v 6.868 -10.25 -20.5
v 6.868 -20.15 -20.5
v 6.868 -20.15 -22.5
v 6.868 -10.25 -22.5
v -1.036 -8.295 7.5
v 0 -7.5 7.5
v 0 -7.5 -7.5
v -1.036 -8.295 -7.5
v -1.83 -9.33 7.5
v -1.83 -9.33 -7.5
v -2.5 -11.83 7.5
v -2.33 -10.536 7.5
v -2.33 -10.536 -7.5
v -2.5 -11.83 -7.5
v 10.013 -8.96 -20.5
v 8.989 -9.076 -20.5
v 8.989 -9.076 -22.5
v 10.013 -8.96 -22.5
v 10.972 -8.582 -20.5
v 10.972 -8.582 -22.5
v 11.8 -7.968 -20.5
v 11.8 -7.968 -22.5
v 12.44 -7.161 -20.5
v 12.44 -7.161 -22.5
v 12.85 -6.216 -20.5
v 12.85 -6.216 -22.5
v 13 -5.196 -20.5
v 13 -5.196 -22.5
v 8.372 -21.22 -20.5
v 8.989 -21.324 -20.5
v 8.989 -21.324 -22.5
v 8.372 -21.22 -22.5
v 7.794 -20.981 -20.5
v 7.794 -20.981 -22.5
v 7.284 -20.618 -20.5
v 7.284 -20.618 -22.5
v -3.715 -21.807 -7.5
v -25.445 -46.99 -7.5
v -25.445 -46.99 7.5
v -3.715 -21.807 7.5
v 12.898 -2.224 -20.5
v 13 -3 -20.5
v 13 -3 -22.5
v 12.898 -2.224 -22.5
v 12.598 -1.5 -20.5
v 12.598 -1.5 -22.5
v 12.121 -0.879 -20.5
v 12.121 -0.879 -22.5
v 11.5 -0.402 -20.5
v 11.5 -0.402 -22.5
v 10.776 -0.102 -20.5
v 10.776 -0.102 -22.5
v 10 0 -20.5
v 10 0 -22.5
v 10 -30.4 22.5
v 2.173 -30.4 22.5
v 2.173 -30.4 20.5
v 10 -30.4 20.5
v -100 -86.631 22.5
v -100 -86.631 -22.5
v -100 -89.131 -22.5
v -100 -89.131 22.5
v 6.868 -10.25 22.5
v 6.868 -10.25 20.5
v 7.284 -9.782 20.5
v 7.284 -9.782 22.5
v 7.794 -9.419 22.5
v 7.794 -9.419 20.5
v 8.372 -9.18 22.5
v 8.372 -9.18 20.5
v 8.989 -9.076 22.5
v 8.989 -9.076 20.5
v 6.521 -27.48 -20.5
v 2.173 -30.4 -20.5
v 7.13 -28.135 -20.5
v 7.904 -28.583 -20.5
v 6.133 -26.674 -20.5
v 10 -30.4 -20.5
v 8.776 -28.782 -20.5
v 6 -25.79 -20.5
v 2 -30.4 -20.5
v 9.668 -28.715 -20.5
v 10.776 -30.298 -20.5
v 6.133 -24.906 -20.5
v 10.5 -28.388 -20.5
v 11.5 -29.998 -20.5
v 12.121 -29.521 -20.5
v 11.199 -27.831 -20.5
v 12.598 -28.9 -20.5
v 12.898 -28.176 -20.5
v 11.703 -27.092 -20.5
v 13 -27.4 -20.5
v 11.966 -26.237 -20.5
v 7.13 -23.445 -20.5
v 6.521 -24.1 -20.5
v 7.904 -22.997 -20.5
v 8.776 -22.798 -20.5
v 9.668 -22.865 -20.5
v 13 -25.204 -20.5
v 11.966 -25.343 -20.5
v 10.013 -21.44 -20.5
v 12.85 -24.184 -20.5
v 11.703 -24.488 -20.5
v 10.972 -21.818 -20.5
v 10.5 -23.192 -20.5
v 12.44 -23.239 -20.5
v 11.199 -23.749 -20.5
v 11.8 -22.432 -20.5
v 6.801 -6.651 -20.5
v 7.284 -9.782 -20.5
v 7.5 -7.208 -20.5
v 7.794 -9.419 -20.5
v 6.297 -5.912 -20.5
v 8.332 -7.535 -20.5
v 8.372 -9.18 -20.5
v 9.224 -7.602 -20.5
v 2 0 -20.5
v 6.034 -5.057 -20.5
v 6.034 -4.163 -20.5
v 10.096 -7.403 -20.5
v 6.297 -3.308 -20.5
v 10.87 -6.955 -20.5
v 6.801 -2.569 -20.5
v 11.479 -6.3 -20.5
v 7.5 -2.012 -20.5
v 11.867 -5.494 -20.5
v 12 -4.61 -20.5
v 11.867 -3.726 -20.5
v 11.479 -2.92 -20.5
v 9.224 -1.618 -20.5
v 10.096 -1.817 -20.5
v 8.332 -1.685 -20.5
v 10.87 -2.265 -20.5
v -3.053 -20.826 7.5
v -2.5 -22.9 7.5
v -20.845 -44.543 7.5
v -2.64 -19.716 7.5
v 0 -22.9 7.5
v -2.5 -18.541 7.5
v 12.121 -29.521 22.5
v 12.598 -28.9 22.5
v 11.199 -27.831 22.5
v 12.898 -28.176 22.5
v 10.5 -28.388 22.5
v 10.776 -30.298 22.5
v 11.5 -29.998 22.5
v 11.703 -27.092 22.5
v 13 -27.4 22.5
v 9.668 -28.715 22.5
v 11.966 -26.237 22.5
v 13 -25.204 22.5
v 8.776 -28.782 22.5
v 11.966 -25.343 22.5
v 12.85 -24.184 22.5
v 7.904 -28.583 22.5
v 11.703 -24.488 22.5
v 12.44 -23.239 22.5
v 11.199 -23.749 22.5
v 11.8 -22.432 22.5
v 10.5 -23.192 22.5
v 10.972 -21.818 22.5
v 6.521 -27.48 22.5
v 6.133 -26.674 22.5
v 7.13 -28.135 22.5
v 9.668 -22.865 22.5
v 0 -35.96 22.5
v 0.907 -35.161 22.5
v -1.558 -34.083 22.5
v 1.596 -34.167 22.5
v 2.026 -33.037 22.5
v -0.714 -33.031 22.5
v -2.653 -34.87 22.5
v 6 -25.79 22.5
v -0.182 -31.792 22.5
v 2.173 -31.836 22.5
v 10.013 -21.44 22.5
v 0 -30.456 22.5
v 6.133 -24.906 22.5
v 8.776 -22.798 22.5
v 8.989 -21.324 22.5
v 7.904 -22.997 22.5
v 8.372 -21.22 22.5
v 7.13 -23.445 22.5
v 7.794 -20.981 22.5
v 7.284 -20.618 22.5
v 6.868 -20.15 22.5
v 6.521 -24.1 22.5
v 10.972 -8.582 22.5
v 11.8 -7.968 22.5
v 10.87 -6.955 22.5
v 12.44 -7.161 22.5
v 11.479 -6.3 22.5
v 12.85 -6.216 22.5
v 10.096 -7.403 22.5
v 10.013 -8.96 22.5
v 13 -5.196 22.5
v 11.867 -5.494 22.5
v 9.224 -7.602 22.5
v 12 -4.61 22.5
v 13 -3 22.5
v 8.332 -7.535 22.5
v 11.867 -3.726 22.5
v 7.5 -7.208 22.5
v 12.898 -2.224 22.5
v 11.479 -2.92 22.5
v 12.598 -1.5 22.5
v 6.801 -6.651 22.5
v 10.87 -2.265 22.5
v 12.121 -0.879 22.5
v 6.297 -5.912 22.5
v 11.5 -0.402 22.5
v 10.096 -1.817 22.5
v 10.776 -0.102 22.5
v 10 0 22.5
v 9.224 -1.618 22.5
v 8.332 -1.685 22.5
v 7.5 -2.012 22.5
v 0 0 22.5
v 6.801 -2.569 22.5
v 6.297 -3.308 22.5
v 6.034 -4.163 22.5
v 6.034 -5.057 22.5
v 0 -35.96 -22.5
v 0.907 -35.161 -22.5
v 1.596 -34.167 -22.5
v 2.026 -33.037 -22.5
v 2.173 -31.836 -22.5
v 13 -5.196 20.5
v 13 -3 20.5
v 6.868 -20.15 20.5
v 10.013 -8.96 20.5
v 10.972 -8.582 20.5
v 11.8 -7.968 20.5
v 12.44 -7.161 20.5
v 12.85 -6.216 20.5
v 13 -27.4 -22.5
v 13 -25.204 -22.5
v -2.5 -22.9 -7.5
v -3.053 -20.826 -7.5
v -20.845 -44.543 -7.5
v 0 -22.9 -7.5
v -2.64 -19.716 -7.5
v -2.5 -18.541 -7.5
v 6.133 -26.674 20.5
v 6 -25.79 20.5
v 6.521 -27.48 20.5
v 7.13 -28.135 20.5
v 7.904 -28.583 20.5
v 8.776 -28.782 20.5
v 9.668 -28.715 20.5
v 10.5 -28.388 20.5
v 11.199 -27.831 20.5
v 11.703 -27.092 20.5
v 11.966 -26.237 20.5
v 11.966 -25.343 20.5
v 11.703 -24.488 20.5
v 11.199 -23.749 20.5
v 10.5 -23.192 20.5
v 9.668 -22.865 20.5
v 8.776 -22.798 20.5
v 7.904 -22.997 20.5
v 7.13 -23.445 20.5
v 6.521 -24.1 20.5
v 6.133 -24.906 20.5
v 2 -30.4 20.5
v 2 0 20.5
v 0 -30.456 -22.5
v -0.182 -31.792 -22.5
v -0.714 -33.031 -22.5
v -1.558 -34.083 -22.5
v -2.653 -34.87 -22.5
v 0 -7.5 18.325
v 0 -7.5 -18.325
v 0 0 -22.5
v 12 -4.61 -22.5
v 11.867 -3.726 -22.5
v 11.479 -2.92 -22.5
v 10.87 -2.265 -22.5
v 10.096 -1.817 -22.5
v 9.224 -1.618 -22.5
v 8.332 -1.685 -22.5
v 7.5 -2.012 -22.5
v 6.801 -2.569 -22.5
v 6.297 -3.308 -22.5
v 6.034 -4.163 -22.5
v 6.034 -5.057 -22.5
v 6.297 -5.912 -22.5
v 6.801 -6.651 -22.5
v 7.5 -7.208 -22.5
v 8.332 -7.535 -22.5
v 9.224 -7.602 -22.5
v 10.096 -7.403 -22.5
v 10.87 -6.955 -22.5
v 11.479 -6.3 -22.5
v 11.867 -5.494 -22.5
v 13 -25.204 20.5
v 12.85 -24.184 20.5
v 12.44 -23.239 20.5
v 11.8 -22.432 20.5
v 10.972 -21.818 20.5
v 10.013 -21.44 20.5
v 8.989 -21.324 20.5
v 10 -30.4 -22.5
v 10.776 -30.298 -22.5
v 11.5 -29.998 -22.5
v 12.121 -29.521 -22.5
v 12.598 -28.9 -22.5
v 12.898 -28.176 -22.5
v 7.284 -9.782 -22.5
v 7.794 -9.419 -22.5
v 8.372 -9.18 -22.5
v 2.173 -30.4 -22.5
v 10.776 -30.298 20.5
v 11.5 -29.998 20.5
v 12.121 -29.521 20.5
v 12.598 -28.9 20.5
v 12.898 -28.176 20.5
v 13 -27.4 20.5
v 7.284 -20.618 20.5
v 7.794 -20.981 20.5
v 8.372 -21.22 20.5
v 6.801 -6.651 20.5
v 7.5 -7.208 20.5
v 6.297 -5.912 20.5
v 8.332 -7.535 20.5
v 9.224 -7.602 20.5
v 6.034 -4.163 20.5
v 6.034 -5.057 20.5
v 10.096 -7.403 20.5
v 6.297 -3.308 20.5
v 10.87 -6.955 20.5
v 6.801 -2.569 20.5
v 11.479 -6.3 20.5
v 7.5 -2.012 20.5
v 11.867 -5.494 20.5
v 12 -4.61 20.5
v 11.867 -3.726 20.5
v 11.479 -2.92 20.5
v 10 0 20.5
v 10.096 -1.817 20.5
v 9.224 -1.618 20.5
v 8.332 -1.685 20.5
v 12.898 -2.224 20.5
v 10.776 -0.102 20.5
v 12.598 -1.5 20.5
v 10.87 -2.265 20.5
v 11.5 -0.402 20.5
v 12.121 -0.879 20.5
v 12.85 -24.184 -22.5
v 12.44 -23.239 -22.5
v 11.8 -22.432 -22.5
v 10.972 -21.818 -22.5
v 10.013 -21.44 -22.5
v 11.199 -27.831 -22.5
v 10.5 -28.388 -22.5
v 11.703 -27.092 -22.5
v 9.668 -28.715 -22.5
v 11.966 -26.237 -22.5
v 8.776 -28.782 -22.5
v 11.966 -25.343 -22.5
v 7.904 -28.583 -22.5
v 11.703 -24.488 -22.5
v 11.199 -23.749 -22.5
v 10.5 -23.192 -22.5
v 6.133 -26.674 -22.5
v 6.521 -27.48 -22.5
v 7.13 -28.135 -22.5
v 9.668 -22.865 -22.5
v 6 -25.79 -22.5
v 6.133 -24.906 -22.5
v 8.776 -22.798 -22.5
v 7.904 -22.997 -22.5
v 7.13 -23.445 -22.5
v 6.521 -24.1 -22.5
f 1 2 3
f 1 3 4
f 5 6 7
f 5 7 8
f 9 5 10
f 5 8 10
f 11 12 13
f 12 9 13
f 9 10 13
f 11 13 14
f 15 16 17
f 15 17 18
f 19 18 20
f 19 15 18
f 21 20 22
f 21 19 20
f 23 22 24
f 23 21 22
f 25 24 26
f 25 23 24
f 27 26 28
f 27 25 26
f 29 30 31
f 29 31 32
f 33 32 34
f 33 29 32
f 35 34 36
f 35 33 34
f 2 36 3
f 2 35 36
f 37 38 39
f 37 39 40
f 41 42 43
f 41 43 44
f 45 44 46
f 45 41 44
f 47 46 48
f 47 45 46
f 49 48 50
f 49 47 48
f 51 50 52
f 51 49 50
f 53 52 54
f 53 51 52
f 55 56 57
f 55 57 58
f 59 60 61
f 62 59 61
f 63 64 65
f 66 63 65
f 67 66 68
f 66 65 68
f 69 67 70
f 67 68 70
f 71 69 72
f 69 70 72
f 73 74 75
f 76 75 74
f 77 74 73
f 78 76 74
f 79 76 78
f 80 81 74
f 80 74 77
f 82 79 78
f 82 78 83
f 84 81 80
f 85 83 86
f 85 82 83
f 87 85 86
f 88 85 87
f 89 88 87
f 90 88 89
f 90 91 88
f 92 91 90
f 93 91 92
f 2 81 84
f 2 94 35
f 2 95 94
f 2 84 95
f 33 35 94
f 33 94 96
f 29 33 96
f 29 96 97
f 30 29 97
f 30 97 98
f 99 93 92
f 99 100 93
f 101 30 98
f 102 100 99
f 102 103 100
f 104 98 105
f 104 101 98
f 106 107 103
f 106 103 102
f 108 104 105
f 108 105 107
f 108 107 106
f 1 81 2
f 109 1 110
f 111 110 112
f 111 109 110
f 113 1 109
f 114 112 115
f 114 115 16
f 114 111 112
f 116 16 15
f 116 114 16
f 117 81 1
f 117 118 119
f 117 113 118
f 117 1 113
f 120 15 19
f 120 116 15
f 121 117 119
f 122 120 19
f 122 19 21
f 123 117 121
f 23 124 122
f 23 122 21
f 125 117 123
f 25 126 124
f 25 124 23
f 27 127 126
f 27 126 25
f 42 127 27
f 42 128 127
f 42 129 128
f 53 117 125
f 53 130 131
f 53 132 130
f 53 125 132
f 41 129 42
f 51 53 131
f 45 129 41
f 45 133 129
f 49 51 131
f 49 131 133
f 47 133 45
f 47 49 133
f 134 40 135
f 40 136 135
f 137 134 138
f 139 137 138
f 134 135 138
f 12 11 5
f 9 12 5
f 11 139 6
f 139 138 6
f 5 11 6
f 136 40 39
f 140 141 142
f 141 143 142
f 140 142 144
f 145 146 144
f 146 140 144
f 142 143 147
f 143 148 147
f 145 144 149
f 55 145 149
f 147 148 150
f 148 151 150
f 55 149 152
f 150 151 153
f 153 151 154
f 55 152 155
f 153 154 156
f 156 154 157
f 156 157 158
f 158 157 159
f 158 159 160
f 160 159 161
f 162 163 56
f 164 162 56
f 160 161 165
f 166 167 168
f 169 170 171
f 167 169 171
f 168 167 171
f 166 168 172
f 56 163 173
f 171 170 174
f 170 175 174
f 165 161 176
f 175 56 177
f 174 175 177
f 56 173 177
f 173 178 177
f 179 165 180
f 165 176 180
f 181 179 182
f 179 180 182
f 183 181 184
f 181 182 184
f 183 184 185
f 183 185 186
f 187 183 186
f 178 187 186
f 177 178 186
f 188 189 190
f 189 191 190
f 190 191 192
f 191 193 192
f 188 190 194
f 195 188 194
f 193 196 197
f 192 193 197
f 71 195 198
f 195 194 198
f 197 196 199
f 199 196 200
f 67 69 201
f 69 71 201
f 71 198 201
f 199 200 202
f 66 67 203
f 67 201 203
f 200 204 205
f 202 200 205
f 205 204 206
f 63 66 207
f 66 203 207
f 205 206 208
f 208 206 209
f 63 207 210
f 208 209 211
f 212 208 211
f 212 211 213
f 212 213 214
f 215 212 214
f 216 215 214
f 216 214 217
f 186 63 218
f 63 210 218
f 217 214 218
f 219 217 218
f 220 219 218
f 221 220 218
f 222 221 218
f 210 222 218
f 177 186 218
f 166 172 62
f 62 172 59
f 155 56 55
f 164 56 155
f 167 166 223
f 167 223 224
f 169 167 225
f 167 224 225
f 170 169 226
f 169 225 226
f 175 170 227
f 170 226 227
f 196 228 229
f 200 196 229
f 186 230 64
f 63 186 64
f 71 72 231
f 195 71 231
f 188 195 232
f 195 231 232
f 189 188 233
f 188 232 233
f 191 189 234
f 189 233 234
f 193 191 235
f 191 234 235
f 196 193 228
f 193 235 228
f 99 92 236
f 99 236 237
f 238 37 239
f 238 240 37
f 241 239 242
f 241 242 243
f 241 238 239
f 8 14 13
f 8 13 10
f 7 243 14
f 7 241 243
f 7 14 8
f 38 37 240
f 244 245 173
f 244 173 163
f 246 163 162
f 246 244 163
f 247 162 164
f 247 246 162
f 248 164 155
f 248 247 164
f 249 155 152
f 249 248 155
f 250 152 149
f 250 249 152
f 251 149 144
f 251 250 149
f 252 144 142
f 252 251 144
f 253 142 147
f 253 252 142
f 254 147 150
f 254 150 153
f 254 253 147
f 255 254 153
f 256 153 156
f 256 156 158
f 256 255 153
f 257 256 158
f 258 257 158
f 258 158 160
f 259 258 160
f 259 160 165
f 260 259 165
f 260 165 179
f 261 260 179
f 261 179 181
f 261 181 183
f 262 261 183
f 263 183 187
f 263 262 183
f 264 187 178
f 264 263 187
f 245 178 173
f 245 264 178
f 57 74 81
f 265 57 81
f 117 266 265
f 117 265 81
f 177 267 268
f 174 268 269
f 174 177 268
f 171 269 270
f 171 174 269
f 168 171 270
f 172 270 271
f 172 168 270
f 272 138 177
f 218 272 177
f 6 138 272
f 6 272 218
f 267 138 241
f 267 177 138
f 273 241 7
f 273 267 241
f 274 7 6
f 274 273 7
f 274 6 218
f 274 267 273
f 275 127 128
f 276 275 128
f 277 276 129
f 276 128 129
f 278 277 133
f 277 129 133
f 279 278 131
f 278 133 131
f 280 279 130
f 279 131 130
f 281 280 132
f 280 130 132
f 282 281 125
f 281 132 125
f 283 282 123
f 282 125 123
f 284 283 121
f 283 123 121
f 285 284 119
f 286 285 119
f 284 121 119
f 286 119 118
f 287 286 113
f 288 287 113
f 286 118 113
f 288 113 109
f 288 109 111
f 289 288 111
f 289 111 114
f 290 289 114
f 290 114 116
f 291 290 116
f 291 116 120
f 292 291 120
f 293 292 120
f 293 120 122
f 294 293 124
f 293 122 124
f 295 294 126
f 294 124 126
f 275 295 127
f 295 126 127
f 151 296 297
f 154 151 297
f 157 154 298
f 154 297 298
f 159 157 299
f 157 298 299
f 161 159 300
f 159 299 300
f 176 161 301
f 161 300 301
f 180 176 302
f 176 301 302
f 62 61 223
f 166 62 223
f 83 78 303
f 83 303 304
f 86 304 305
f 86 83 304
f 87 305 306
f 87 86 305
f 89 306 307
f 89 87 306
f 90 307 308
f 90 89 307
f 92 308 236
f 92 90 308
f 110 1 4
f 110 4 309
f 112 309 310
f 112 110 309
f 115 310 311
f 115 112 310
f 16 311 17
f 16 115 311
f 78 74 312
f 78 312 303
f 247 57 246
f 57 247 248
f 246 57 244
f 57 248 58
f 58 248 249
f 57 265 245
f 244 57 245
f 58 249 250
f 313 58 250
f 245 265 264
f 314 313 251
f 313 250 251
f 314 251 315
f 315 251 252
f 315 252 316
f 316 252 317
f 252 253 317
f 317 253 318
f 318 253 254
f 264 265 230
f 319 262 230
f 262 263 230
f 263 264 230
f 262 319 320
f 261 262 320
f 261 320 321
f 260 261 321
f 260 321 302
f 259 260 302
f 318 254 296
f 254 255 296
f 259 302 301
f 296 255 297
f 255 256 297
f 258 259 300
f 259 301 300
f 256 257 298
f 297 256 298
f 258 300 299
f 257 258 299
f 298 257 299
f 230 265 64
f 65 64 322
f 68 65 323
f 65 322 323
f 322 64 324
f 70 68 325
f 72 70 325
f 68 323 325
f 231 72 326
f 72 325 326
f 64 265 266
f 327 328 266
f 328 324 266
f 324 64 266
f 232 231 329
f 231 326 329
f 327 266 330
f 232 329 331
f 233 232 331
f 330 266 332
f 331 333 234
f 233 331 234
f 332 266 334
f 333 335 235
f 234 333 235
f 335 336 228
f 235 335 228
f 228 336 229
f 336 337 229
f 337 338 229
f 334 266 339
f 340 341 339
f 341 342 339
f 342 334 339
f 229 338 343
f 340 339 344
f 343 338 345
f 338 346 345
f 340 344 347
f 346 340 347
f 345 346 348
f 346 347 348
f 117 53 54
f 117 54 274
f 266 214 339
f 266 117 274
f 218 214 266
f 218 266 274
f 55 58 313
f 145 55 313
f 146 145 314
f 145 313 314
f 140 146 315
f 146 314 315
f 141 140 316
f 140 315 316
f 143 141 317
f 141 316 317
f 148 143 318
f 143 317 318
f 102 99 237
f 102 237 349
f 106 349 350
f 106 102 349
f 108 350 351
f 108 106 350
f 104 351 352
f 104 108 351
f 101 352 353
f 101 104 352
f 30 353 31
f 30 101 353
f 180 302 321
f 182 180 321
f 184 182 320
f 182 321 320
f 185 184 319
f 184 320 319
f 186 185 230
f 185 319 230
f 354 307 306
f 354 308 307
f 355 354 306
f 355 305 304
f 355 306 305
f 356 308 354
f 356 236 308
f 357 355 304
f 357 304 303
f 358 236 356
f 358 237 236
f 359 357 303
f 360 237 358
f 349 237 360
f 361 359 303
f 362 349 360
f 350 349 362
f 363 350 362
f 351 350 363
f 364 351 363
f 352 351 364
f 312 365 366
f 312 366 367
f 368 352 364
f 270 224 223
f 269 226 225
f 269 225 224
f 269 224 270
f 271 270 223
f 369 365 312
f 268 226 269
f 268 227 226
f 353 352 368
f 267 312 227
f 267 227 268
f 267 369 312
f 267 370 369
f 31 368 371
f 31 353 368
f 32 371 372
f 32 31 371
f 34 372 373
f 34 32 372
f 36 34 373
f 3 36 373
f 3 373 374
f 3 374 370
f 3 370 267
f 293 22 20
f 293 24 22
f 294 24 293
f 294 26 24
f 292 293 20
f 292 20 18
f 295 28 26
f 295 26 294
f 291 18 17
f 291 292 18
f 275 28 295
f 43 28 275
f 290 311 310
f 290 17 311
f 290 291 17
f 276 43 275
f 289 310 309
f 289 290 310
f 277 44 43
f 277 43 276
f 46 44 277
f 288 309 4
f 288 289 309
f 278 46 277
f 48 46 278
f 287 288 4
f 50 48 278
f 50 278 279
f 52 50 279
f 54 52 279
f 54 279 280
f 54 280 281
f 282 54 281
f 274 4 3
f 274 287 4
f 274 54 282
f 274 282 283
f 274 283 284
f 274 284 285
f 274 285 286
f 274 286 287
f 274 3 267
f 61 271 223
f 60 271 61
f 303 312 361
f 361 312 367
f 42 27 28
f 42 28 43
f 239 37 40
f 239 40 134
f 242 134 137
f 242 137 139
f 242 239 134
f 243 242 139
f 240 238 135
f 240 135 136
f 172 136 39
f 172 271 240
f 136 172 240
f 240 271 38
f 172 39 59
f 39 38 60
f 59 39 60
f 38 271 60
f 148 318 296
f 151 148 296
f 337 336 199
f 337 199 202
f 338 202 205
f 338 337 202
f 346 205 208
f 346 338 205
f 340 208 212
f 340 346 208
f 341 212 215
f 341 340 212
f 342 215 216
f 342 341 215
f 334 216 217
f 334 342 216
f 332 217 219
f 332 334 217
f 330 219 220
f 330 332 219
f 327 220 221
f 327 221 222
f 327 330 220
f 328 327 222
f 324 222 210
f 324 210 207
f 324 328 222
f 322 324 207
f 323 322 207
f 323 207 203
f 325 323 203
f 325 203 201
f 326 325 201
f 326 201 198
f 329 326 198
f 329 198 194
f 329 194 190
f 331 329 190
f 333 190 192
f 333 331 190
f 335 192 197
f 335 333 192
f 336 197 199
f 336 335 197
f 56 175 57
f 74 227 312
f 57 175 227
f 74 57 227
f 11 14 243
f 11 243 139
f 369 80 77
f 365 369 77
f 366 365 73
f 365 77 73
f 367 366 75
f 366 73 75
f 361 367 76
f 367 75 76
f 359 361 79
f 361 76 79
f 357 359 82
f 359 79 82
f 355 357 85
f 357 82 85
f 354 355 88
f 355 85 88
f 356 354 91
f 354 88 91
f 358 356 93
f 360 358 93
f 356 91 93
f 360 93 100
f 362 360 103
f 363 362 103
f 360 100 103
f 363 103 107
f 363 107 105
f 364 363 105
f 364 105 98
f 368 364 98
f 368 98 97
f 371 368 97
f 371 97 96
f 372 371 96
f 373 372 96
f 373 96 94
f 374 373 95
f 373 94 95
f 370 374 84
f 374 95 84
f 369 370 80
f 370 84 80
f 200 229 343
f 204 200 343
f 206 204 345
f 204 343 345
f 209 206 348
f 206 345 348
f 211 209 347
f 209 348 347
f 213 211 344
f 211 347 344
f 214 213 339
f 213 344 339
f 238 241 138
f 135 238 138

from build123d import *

# Parameters (mm, degrees)
ESQUISSE1_W         = 41
ESQUISSE1_H         = 30.4
BOSS_EXTRU_1_DEPTH  = 2
ESQUISSE3_R         = 3
BOSS_EXTRU_2_DEPTH  = 2
ESQUISSE4_W         = 15
ESQUISSE4_H         = 15.4
BOSS_EXTRU_3_DEPTH  = 2.5
BOSS_EXTRU_9_DEPTH  = 45
BOSS_EXTRU_10_DEPTH = 15
ESQUISSE13_W        = 2.172512758
ESQUISSE13_H        = 5.56
BOSS_EXTRU_11_DEPTH = 45
CONG_2_R            = 5
CONG_3_R            = 5
CONG_4_R            = 5


with BuildPart() as part:
    # Esquisse1 → Boss.-Extru.1 (new body)
    with BuildSketch(Plane(origin=(0, 0, 0), x_dir=(0, 0, -1), z_dir=(1, 0, 0))):
        with Locations((0, -15.2)):
            Rectangle(ESQUISSE1_W, ESQUISSE1_H)
    extrude(amount=BOSS_EXTRU_1_DEPTH)

    # Esquisse3 → Boss.-Extru.2 (add)
    with BuildSketch(Plane.XY.offset(20.5)):
        with BuildLine():
            Line((0, 0), (0, -30.4))
            Line((0, -30.4), (10, -30.4))
            ThreePointArc((10, -30.4), (12.121320344, -29.521320344), (13, -27.4))
            Line((13, -27.4), (13, -25.203998005))
            ThreePointArc((13, -25.203998005), (11.799859401, -22.431518929), (8.989283799, -21.323528643))
            ThreePointArc((8.989283799, -21.323528643), (7.793527962, -20.98117775), (6.868390743, -20.149819053))
            Line((6.868390743, -20.149819053), (6.868390743, -10.250180947))
            ThreePointArc((6.868390743, -10.250180947), (7.793527962, -9.41882225), (8.989283799, -9.076471357))
            ThreePointArc((8.989283799, -9.076471357), (11.799859401, -7.968481071), (13, -5.196001995))
            Line((13, -5.196001995), (13, -3))
            ThreePointArc((13, -3), (12.121320344, -0.878679656), (10, 0))
            Line((10, 0), (0, 0))
        make_face()
        with Locations((9, -4.61)):
            Circle(ESQUISSE3_R, mode=Mode.SUBTRACT)
        with Locations(Location((9, -25.79, 0), (0, 0, 180))):
            Circle(ESQUISSE3_R, mode=Mode.SUBTRACT)
    boss_extru_2 = extrude(amount=BOSS_EXTRU_2_DEPTH)

    # Symétrie1: Boss.-Extru.2 across plane
    add(boss_extru_2.mirror(Plane.XY))

    # Esquisse4 → Boss.-Extru.3 (add)
    with BuildSketch(Plane.ZY):
        with Locations((0, -15.2)):
            Rectangle(ESQUISSE4_W, ESQUISSE4_H)
    extrude(amount=BOSS_EXTRU_3_DEPTH)



with BuildPart() as body_2:
    # Esquisse11 → Boss.-Extru.9 (new body)
    with BuildSketch(Plane(origin=(0, 0, -22.5), x_dir=(-1, 0, 0), z_dir=(0, 0, -1))):
        Polygon((100, -86.630943166), (100, -89.130943166), (0, -35.96), (0, -33.46), align=None)
    extrude(amount=-BOSS_EXTRU_9_DEPTH)


with BuildPart() as part_1:
    add(part.part)

    add(body_2.part)  # Boss.-Extru.10 merges body 2
    # Esquisse12 → Boss.-Extru.10 (add)
    with BuildSketch(Plane(origin=(0, 0, -7.5), x_dir=(-1, 0, 0), z_dir=(0, 0, -1))):
        Polygon((2.5, -22.9), (20.844614881, -44.543278331), (25.445497181, -46.989610844), (2.5, -20.4), align=None)
    extrude(amount=-BOSS_EXTRU_10_DEPTH)

    # Esquisse13 → Boss.-Extru.11 (add)
    with BuildSketch(Plane(origin=(0, 0, -22.5), x_dir=(-1, 0, 0), z_dir=(0, 0, -1))):
        with Locations((-1.086256379, -33.18)):
            Rectangle(ESQUISSE13_W, ESQUISSE13_H)
    extrude(amount=-BOSS_EXTRU_11_DEPTH)

    # Congé2
    # the kernel refuses this fillet: 5 mm, written as the material it takes off along each edge
    with BuildSketch(Plane(origin=(2.172512758, -35.96, -32.809375556), x_dir=(0, 1, 0), z_dir=(0, 0, 1))) as cong_2_piece_1:
        with BuildLine():
            CenterArc((4.123750222, 5), CONG_2_R, 214.436842146, 55.563157854)
            Line((0, 2.172512758), (-0.082475004, 2.115963013))
            ThreePointArc((-0.082475004, 2.115963013), (-0.1, 1.086256379), (-0.1, 0))
            Line((-0.1, 0), (0, -0.1))
            Line((0, -0.1), (4.123750222, -0.1))
            Line((4.123750222, -0.1), (4.123750222, 0))
        make_face()
    extrude(amount=65.618751112, mode=Mode.SUBTRACT)

    # Congé3
    cong_3_edges = [part_1.edges().sort_by_distance(p)[0] for p in [
        (0, -33.46, 0),
    ]]
    fillet(cong_3_edges, radius=CONG_3_R)

    # Congé4
    # the kernel refuses this fillet: 5 mm, written as the material it adds along each edge
    with BuildSketch(Plane(origin=(-2.5, -20.4, -7.5), x_dir=(-0.6533220619728018, -0.7570801036479604, 0), z_dir=(0, 0, 1))) as cong_4_piece_1:
        with BuildLine():
            CenterArc((CONG_4_R * 0.3718225826, -CONG_4_R), CONG_4_R, 90, 40.792541927)
            Line((-CONG_4_R * 0.281499479373, -CONG_4_R * 0.242919896352), (0, 0))
            Line((0, 0), (CONG_4_R * 0.3718225826, 0))
        make_face()
    extrude(amount=15)
    # the kernel refuses this fillet: 5 mm, written as the material it takes off along each edge
    with BuildSketch(Plane(origin=(-2.5, -7.5, -18.325317547), x_dir=(1, 0, 0), z_dir=(0, 0, 1))) as cong_4_2_piece_1:
        with BuildLine():
            CenterArc((5, -4.330127019), CONG_4_R, 120, 60)
            Line((0, -4.330127019), (0, 0))
            Line((0, 0), (2.5, 0))
        make_face()
    extrude(amount=36.650635095, mode=Mode.SUBTRACT)


solid = part_1.part
